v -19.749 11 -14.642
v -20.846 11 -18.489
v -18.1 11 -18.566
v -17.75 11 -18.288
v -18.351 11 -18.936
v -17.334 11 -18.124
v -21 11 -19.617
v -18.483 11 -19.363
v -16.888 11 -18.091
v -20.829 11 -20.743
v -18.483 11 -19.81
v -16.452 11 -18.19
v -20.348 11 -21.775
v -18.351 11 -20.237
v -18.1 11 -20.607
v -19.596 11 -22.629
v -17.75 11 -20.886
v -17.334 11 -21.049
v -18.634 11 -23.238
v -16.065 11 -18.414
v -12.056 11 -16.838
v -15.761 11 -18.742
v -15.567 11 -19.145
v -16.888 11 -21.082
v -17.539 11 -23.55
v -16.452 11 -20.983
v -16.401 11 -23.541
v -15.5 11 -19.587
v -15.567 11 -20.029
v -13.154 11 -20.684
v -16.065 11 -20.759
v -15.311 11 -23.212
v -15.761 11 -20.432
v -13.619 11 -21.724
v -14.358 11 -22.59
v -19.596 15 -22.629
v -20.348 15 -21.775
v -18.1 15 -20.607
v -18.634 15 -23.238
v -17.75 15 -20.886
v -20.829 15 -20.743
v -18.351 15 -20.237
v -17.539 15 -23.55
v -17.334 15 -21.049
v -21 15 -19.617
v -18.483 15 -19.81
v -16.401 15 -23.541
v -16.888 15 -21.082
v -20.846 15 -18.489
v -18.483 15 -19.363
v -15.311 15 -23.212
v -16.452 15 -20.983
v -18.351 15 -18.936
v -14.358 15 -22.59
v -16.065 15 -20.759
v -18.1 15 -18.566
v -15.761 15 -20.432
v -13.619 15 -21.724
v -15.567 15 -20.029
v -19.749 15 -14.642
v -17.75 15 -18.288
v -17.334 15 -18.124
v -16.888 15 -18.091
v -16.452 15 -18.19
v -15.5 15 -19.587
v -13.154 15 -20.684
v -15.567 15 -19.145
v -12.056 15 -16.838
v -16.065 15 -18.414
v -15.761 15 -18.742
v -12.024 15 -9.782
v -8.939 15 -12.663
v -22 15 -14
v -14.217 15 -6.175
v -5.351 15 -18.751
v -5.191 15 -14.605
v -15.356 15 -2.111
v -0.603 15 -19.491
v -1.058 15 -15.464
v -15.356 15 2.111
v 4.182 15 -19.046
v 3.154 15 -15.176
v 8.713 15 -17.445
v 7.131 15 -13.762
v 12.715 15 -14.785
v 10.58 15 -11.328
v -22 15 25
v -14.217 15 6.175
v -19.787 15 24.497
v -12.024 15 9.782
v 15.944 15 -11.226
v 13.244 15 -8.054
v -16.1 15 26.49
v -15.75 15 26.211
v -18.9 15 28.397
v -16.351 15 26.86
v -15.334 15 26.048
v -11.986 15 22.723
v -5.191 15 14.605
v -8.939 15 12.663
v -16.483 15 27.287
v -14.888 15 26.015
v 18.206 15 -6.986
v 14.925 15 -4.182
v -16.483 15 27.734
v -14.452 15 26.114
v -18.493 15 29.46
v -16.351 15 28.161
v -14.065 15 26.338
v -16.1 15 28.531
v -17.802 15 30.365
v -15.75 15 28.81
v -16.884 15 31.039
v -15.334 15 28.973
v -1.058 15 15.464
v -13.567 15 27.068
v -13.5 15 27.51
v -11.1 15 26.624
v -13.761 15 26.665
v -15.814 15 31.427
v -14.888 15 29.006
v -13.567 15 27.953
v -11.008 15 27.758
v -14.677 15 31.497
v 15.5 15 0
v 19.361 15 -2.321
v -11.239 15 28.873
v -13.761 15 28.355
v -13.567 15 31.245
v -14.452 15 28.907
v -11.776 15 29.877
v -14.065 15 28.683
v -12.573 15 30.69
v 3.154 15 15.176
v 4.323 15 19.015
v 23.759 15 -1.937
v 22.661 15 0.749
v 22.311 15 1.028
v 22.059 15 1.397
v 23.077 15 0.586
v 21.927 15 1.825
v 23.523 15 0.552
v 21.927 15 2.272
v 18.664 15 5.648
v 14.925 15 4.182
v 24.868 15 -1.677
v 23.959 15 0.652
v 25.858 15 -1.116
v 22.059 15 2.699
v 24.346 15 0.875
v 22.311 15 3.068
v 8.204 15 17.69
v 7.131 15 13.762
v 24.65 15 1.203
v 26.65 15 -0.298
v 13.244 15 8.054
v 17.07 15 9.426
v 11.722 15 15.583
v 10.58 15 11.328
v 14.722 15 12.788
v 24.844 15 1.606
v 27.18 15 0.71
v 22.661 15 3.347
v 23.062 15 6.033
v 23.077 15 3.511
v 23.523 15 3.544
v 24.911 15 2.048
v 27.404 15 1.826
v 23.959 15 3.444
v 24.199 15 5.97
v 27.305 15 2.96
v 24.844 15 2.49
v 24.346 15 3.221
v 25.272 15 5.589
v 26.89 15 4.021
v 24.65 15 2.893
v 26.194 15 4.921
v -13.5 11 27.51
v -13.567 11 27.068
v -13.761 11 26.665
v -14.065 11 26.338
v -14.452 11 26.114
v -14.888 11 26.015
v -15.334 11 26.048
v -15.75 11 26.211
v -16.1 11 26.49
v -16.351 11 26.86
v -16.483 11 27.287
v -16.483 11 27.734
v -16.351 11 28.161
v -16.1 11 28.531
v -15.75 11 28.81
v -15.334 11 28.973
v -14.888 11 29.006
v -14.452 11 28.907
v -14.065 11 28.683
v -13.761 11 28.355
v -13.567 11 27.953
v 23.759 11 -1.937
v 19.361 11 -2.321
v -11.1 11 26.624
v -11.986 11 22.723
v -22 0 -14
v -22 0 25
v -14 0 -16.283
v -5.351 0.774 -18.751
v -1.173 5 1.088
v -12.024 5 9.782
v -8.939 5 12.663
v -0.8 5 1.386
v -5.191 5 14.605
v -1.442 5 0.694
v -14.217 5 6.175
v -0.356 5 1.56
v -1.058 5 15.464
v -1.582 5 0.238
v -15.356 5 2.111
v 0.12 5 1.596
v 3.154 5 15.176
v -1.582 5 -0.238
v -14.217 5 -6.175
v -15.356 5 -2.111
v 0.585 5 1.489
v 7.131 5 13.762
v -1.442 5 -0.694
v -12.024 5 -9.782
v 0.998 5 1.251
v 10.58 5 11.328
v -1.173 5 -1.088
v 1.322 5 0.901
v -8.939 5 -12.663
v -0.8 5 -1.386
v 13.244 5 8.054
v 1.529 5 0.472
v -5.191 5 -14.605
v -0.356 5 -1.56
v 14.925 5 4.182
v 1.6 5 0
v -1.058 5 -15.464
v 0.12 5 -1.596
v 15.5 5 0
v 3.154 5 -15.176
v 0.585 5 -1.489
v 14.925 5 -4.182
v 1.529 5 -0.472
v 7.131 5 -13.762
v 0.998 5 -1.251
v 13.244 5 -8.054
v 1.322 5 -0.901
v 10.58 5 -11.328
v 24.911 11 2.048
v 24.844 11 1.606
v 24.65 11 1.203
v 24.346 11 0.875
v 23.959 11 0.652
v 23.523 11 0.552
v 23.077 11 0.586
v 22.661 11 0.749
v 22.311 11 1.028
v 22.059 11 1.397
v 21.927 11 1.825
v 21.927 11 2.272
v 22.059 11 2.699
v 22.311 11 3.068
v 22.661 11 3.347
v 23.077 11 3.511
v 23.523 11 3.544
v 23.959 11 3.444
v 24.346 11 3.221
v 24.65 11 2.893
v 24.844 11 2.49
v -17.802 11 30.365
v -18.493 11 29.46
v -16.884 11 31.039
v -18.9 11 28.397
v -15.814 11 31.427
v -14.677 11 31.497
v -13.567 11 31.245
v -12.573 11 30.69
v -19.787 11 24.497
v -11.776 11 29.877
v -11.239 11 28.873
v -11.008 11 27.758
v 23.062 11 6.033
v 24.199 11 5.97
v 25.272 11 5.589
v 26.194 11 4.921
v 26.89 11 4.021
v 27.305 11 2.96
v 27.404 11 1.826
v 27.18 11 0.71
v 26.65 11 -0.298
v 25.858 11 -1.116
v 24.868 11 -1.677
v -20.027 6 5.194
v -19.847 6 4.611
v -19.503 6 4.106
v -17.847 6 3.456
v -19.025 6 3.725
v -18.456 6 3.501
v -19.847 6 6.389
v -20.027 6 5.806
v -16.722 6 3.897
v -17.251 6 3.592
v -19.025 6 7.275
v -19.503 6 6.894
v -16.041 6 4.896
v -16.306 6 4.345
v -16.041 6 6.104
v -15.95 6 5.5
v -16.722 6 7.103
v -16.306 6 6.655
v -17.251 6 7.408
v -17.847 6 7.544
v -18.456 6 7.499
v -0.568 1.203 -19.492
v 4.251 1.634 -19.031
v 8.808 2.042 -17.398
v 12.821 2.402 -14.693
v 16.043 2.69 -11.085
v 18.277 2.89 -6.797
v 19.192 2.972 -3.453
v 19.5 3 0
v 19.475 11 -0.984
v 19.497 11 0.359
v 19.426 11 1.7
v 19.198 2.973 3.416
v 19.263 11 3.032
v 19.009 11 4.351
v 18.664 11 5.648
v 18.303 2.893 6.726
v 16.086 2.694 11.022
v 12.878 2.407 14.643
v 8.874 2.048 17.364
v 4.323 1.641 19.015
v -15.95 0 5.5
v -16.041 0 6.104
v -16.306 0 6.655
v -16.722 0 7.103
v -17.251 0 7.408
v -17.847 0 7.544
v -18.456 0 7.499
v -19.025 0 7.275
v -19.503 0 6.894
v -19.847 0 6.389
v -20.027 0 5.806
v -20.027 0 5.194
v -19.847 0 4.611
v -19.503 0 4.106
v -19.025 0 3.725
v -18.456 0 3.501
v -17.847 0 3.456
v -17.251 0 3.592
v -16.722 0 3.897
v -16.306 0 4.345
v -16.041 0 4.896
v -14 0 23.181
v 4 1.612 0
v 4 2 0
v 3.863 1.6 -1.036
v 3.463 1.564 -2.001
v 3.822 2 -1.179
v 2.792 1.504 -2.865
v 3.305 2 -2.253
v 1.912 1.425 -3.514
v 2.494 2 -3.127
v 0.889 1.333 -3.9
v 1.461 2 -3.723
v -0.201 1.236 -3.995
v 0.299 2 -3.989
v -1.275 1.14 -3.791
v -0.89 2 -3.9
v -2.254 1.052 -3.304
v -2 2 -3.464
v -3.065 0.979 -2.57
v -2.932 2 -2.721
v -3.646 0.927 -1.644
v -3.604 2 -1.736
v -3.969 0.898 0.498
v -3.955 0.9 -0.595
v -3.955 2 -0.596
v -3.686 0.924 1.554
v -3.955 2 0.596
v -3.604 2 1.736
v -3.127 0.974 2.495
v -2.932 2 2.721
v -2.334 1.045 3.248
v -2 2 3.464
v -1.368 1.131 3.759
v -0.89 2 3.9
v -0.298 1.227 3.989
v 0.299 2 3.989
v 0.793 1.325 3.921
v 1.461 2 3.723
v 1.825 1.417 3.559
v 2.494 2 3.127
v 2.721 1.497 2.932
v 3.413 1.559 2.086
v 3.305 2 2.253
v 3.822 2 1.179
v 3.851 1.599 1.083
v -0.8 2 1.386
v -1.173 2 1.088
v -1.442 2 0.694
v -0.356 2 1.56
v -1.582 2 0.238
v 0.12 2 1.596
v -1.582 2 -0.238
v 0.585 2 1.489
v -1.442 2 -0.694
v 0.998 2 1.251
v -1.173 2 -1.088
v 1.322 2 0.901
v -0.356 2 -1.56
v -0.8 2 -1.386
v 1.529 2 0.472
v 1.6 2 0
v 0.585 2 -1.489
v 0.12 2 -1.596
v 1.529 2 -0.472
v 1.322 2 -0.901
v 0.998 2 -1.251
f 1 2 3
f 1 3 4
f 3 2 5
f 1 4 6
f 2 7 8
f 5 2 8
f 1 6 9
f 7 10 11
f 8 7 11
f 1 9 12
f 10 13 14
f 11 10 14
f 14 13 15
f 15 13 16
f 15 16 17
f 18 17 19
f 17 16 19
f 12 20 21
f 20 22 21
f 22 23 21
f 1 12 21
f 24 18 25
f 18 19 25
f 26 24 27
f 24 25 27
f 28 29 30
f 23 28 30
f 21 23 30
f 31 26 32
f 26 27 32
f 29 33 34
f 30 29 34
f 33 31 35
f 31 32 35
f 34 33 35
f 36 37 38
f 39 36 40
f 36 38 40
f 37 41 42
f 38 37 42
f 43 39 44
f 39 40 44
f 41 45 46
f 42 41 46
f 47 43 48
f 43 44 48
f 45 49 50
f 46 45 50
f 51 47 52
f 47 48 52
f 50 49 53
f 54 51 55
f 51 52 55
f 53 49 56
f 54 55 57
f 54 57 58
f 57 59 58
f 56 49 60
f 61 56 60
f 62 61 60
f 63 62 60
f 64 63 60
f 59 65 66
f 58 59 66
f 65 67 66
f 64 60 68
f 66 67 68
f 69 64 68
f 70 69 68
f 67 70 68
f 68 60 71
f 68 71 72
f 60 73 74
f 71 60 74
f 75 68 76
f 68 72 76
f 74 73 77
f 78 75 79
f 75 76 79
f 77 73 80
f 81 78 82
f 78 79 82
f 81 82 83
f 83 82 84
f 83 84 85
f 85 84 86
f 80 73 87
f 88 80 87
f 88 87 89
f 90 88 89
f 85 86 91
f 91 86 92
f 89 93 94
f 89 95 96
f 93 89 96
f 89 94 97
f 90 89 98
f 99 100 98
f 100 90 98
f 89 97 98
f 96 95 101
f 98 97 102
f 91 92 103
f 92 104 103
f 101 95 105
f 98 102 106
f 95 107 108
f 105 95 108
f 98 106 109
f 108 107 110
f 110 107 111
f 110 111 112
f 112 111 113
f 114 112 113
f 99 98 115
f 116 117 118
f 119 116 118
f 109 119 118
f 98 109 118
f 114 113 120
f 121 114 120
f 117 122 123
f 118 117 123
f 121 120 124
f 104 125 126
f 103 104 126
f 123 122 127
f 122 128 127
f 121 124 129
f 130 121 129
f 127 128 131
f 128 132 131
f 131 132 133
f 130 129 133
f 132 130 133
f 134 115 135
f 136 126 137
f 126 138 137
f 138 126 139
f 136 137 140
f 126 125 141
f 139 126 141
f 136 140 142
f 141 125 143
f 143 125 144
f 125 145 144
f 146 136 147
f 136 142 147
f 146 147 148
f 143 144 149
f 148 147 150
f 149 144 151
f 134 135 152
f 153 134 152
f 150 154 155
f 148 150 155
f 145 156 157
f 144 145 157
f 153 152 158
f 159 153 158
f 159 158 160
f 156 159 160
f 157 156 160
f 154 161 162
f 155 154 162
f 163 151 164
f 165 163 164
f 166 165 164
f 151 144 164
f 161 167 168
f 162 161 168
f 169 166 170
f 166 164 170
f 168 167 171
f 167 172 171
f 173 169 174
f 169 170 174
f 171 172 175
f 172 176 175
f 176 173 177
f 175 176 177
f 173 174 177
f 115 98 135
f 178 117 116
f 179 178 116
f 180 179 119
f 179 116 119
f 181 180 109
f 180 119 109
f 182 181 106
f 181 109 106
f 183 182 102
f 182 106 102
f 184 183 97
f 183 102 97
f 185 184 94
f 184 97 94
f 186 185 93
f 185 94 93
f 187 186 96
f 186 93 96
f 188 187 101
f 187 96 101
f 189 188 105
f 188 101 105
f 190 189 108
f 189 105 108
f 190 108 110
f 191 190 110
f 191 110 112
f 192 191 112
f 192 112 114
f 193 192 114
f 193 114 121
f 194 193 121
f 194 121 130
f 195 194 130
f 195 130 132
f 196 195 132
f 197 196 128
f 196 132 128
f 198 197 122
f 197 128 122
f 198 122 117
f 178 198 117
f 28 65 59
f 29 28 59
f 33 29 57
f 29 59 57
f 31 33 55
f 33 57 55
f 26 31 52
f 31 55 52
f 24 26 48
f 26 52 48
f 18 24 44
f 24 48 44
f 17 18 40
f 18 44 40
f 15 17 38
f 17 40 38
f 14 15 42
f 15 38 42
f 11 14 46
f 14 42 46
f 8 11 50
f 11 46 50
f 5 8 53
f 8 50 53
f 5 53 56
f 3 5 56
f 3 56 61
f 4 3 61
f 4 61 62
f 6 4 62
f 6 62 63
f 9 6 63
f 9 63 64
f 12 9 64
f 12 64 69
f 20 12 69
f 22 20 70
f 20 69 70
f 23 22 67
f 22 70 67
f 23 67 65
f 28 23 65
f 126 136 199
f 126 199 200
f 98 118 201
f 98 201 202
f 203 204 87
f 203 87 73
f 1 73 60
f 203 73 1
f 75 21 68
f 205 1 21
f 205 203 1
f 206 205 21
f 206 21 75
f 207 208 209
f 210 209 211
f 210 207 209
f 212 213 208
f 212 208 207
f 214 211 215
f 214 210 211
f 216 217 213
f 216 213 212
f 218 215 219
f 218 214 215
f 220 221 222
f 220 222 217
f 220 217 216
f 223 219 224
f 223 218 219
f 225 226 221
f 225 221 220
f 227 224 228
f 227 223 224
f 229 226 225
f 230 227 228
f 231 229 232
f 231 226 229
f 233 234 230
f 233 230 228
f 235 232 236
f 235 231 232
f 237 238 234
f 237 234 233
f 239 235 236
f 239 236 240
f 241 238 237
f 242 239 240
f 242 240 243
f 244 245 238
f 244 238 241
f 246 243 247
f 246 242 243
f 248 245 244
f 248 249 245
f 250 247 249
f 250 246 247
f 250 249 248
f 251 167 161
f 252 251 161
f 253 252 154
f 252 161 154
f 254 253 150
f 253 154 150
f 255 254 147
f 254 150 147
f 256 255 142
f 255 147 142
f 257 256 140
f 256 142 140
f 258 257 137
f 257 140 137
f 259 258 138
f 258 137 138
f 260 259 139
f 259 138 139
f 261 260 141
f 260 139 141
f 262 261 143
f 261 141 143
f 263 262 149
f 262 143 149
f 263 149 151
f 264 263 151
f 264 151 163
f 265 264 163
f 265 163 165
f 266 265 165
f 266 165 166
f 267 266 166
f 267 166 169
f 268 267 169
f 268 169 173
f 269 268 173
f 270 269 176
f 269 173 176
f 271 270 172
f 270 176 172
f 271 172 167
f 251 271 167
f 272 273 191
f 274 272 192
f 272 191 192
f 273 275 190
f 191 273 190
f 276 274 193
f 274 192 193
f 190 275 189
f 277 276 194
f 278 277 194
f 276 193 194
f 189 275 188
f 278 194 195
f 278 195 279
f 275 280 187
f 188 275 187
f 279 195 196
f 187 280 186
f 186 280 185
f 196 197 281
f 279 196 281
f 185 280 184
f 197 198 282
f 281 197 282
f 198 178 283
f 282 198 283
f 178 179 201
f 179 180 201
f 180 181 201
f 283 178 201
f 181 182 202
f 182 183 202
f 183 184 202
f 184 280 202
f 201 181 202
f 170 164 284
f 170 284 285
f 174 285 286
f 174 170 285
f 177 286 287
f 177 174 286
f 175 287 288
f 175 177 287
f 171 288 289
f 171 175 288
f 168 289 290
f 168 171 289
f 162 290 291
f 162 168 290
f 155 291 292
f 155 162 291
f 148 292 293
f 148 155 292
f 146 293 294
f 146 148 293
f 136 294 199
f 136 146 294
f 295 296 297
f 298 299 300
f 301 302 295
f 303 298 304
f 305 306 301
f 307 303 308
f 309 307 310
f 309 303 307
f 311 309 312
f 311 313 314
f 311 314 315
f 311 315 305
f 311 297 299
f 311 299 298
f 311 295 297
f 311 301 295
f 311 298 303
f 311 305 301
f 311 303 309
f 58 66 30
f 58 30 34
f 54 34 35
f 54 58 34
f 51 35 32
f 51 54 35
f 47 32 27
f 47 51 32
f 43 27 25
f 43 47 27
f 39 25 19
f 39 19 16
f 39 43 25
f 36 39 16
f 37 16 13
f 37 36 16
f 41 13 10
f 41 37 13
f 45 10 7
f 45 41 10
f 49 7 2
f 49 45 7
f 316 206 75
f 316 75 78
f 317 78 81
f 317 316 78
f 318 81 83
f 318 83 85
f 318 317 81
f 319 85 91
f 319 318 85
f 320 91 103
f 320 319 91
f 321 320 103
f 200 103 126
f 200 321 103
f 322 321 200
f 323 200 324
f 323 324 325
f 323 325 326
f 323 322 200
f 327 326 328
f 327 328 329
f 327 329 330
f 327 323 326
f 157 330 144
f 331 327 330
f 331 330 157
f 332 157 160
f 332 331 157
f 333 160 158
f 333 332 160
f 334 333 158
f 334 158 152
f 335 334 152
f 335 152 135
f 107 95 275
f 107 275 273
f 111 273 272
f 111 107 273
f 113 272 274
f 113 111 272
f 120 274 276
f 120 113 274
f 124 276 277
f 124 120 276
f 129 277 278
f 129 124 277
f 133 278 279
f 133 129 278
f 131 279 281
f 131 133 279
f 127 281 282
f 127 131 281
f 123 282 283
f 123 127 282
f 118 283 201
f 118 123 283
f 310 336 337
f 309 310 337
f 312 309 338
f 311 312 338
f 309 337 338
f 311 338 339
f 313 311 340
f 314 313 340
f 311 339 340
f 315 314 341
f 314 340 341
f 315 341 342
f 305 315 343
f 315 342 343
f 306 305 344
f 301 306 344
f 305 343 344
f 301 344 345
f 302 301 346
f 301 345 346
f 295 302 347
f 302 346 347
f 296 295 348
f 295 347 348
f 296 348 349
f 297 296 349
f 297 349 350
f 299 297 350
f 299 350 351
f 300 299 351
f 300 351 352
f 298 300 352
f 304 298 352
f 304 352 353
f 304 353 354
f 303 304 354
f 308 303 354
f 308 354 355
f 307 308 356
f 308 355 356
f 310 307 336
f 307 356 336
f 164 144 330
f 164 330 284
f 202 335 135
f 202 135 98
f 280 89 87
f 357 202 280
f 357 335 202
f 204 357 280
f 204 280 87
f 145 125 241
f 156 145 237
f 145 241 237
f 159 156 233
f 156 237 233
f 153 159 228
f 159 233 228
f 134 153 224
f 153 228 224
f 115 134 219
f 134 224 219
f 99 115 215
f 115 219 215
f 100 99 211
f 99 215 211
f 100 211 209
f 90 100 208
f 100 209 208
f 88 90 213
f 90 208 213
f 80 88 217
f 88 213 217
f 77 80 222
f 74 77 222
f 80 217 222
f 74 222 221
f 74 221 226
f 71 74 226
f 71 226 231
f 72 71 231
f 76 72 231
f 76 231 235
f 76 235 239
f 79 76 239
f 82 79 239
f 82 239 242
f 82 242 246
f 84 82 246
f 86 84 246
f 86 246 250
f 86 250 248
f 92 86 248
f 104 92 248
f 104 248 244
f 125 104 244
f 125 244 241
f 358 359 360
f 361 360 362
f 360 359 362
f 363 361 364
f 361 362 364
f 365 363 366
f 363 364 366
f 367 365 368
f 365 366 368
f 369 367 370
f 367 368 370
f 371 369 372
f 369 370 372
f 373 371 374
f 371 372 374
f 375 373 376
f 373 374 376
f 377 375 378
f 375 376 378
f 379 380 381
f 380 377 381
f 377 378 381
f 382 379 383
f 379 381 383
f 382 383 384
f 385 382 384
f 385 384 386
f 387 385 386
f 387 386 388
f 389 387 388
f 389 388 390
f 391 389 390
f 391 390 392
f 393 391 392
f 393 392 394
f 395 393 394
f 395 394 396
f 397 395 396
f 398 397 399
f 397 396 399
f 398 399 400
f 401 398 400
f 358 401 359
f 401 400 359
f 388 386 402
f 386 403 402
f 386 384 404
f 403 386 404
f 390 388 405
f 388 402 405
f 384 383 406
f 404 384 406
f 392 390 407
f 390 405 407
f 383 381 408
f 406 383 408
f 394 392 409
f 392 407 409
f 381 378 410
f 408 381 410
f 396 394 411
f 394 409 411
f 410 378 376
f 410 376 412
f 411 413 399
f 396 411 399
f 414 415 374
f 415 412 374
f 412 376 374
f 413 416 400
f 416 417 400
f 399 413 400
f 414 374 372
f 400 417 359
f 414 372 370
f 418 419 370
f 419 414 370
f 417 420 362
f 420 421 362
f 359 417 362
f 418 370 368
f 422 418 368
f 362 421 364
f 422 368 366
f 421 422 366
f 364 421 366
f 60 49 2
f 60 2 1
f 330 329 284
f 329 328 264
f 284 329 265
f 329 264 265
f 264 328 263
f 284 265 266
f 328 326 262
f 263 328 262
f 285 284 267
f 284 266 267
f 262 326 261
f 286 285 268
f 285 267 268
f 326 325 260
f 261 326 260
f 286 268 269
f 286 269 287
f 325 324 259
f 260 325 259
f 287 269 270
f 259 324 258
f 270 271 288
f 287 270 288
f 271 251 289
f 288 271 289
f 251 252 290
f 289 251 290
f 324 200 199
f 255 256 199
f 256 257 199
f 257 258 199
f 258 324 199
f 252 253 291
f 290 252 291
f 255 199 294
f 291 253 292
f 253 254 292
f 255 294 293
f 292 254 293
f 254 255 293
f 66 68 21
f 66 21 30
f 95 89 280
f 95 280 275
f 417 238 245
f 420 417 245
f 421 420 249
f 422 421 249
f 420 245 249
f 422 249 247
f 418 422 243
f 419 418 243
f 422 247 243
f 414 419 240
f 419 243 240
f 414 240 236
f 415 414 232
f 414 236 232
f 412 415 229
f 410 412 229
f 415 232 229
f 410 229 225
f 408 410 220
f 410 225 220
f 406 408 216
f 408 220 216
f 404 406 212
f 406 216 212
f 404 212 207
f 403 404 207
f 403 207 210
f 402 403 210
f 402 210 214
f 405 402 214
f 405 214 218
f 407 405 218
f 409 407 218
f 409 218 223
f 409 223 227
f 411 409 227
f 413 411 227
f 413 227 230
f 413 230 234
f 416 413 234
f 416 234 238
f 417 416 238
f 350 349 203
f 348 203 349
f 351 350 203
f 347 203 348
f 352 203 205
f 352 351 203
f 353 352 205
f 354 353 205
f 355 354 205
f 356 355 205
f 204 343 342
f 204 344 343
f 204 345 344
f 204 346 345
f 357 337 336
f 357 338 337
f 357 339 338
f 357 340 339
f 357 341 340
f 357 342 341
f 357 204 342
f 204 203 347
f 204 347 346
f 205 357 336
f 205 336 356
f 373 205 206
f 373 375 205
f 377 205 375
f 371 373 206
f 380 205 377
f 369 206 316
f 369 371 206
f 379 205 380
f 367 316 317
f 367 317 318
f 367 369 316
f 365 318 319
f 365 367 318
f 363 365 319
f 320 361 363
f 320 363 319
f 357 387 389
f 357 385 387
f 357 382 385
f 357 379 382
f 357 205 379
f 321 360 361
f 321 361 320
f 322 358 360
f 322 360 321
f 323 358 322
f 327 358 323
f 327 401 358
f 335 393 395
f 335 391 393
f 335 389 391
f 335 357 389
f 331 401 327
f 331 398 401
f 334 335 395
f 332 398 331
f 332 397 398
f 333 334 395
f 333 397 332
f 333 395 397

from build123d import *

# Parameters (mm, degrees)
SKETCH1_R               = 15.5
BOSS_EXTRUDE1_DEPTH     = 5
SKETCH2_R               = 15.5
BOSS_EXTRUDE2_DEPTH     = 15
CUT_EXTRUDE7_DEPTH      = 26
CUT_EXTRUDE7_DEPTH_BACK = 20.5
SKETCH18_R              = 1.6
CUT_EXTRUDE8_DEPTH      = 6
SKETCH19_R              = 2.05
CUT_EXTRUDE9_DEPTH      = 6
CUT_EXTRUDE10_REACH     = 4
SKETCH20_R              = 4
SKETCH21_R              = 1.5
SKETCH21_R_2            = 4
BOSS_EXTRUDE3_DEPTH     = 4


with BuildPart() as part:
    # Sketch1 → Boss-Extrude1 (new body)
    with BuildSketch(Plane(origin=(0, 0, 0), x_dir=(1, 0, 0), z_dir=(0, 1, 0))):
        Circle(SKETCH1_R)
    extrude(amount=BOSS_EXTRUDE1_DEPTH)

    # Sketch2 → Boss-Extrude2 (add)
    with BuildSketch(Plane.XZ):
        with BuildLine():
            Line((-22, -14), (-5.351429285, -18.751325409))
            ThreePointArc((-5.351429285, -18.751325409), (18.889988887, -4.839247858), (4.323483194, 19.014665211))
            Line((4.323483194, 19.014665211), (-22, 25))
            Line((-22, 25), (-22, -14))
        make_face()
        Circle(SKETCH2_R, mode=Mode.SUBTRACT)
    extrude(amount=-BOSS_EXTRUDE2_DEPTH)

    # Sketch17 → Cut-Extrude7 (cut, two sides)
    with BuildSketch(Plane.XY) as cut_extrude7_sk:
        Polygon((19.5, 0), (-14, 0), (19.5, 3), align=None)
    extrude(amount=CUT_EXTRUDE7_DEPTH, mode=Mode.SUBTRACT)
    extrude(cut_extrude7_sk.sketch, amount=-CUT_EXTRUDE7_DEPTH_BACK, mode=Mode.SUBTRACT)

    # Sketch18 → Cut-Extrude8 (cut, through all)
    with BuildSketch(Plane(origin=(0, 5, 0), x_dir=(1, 0, 0), z_dir=(0, 1, 0))):
        Circle(SKETCH18_R)
    extrude(amount=-CUT_EXTRUDE8_DEPTH, mode=Mode.SUBTRACT)

    # Sketch19 → Cut-Extrude9 (cut)
    with BuildSketch(Plane.XZ):
        with Locations((-18, 5.5)):
            Circle(SKETCH19_R)
    extrude(amount=-CUT_EXTRUDE9_DEPTH, mode=Mode.SUBTRACT)

    # Sketch20 → Cut-Extrude10 (cut, up to next)
    with BuildSketch(Plane(origin=(0, 2, 0), x_dir=(1, 0, 0), z_dir=(0, 1, 0)), mode=Mode.PRIVATE) as cut_extrude10_sk1:
        Circle(SKETCH20_R)
    cut_extrude10_tool1 = extrude(cut_extrude10_sk1.sketch, amount=-CUT_EXTRUDE10_REACH, mode=Mode.PRIVATE) & part.part
    add(cut_extrude10_tool1.solids().sort_by_distance((0, 2, 0))[0], mode=Mode.SUBTRACT)

    # Sketch21 → Boss-Extrude3 (add)
    with BuildSketch(Plane(origin=(0, 15, 0), x_dir=(1, 0, 0), z_dir=(0, 1, 0))):
        with BuildLine():
            ThreePointArc((-13.153574275, 20.684381981), (-18.097729084, 23.433078622), (-20.846425725, 18.488923813))
            Line((-20.846425725, 18.488923813), (-19.748696641, 14.642498088))
            Line((-19.748696641, 14.642498088), (-12.055845191, 16.837956256))
            Line((-12.055845191, 16.837956256), (-13.153574275, 20.684381981))
        make_face()
        with Locations((-17, 19.586652897)):
            Circle(SKETCH21_R, mode=Mode.SUBTRACT)
        with BuildLine():
            Line((-11.099555854, -26.623594872), (-11.986424202, -22.723150726))
            Line((-11.986424202, -22.723150726), (-19.787312493, -24.496887421))
            Line((-19.787312493, -24.496887421), (-18.900444146, -28.397331567))
            ThreePointArc((-18.900444146, -28.397331567), (-14.113131653, -31.410907365), (-11.099555854, -26.623594872))
        make_face()
        with Locations((-15, -27.51046322)):
            Circle(SKETCH21_R, mode=Mode.SUBTRACT)
        with BuildLine():
            ThreePointArc((23.061952434, -6.032938747), (20.346397625, -4.619310384), (19.425796615, -1.699536959))
            ThreePointArc((19.425796615, -1.699536959), (19.147003171, -3.69354431), (18.664086253, -5.648175312))
            Line((18.664086253, -5.648175312), (23.061952434, -6.032938747))
        make_face()
        with Locations((23.410575405, -2.048159955)):
            Circle(SKETCH21_R_2)
        with Locations((23.410575405, -2.048159955)):
            Circle(SKETCH21_R, mode=Mode.SUBTRACT)
        with BuildLine():
            Line((23.759198376, 1.936618838), (19.361332194, 2.321382272))
            ThreePointArc((19.361332194, 2.321382272), (19.497494408, 0.31258889), (19.425796615, -1.699536959))
            ThreePointArc((19.425796615, -1.699536959), (20.839424976, 1.016017826), (23.759198376, 1.936618838))
        make_face()
    extrude(amount=-BOSS_EXTRUDE3_DEPTH)


solid = part.part
